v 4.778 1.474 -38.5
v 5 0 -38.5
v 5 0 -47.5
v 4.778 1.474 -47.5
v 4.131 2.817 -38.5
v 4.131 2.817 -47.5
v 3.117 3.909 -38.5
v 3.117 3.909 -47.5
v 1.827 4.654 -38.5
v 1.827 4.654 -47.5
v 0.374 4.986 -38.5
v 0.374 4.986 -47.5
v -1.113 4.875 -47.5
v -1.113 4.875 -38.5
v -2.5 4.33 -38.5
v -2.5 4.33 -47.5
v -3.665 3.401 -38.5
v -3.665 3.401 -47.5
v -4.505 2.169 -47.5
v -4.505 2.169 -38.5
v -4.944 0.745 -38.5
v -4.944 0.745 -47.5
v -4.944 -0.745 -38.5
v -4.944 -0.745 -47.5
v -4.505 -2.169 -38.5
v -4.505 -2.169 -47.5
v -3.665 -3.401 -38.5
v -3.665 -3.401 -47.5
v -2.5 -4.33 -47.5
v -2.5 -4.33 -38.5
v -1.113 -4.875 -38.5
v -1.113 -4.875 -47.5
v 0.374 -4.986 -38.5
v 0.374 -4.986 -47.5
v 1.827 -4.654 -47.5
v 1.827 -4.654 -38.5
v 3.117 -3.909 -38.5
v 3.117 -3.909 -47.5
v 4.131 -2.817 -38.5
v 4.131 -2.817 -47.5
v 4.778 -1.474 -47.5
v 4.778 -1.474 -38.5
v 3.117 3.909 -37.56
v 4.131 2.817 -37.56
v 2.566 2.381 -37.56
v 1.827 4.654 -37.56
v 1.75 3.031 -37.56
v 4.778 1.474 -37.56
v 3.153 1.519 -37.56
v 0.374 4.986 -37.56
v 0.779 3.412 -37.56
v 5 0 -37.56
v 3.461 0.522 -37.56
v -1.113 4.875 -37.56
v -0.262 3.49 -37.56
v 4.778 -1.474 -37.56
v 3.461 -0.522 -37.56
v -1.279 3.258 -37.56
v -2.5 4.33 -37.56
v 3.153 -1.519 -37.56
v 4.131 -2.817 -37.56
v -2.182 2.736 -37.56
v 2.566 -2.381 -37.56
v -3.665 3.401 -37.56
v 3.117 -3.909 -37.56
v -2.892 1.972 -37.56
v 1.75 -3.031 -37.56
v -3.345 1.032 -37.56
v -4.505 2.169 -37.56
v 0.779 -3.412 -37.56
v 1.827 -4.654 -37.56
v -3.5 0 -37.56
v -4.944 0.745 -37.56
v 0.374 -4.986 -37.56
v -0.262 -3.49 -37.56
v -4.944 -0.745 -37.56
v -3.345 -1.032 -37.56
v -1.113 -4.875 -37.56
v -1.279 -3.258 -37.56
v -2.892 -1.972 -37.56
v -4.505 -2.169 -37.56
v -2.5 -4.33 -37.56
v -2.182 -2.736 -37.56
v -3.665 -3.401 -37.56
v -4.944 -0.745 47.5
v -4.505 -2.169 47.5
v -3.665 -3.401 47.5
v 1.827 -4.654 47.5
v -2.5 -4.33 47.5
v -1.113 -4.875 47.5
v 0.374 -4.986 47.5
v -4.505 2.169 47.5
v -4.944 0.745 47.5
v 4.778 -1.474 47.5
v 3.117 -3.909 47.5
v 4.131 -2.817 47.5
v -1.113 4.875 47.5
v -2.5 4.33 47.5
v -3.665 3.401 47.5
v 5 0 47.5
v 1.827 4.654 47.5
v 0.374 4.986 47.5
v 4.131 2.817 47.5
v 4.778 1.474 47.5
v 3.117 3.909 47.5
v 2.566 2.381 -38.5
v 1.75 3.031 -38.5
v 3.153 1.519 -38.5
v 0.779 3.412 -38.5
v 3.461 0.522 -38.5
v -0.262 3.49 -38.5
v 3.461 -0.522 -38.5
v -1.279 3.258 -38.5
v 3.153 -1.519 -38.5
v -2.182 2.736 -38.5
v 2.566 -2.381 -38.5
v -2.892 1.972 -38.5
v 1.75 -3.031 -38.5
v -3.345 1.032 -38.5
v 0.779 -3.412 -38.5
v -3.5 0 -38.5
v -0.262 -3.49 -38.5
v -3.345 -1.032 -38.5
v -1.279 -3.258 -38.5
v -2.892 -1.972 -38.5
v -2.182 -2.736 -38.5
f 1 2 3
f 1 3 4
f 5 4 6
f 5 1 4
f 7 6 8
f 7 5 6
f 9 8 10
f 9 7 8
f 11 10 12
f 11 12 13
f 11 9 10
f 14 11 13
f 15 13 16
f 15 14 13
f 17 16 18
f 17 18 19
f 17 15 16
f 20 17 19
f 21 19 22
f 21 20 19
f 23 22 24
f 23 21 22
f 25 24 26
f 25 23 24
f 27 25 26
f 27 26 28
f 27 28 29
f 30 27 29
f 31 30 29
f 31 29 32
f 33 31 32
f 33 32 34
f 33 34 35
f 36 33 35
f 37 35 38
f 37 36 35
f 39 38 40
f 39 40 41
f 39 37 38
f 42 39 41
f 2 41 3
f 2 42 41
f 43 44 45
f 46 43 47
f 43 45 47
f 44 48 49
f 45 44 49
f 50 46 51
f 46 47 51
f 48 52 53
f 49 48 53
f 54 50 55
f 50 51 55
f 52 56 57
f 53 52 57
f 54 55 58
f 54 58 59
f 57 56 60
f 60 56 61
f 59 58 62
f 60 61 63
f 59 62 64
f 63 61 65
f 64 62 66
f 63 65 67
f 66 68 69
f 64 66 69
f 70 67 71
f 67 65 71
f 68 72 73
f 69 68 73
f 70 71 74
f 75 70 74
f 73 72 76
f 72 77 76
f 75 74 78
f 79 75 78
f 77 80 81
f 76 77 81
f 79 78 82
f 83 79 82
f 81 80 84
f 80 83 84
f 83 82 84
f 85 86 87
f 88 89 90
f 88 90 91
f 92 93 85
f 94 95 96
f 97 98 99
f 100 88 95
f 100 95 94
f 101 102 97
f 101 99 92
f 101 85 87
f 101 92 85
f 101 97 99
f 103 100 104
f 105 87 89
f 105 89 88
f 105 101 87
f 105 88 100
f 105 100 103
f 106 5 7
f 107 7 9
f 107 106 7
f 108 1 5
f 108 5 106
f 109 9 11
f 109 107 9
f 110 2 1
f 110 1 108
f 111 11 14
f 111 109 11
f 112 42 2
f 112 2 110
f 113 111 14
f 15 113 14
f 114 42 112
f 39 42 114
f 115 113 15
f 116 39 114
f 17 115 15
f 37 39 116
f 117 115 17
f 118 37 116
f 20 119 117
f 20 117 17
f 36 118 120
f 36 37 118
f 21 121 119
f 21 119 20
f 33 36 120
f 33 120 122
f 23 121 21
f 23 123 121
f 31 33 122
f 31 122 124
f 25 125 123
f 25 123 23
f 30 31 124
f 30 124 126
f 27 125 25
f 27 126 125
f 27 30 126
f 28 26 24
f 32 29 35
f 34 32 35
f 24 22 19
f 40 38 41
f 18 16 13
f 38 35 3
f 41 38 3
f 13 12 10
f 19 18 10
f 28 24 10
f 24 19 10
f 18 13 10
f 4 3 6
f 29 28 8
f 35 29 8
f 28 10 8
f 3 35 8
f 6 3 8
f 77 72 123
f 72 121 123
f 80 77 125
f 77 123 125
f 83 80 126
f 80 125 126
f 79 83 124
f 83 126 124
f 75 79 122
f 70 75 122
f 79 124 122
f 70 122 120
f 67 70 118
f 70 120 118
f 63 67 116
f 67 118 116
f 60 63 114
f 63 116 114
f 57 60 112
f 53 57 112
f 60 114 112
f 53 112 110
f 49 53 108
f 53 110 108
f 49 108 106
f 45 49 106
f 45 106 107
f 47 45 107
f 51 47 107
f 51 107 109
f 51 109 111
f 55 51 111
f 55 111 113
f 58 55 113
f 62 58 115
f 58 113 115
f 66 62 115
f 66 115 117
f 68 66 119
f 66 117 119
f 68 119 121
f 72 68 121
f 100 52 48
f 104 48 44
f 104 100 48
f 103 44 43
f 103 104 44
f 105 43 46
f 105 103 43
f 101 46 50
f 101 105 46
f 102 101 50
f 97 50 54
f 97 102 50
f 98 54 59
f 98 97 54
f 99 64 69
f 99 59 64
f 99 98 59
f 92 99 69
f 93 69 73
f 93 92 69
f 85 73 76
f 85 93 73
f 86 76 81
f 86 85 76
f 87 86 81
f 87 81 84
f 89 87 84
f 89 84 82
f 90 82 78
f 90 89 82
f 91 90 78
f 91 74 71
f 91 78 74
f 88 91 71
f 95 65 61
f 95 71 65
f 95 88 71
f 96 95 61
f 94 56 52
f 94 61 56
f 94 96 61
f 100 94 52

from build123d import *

# Parameters (mm, degrees)
SKETCH1_R           = 5
BOSS_EXTRUDE1_DEPTH = 47.5
SKETCH2_W           = 1.5
SKETCH2_H           = 0.94


with BuildPart() as part:
    # Sketch1 → Boss-Extrude1 (new, symmetric)
    with BuildSketch(Plane.XY):
        Circle(SKETCH1_R)
    extrude(amount=BOSS_EXTRUDE1_DEPTH, both=True)

    # Sketch2 → Cut-Revolve1 (revolve, cut)
    with BuildSketch(Plane(origin=(0, 0, 0), x_dir=(1, 0, 0), z_dir=(0, 1, 0))):
        with Locations((-4.25, 38.03)):
            Rectangle(SKETCH2_W, SKETCH2_H)
    revolve(axis=Axis((0, 0, -47.5), (0, 0, 1)), mode=Mode.SUBTRACT)


solid = part.part
